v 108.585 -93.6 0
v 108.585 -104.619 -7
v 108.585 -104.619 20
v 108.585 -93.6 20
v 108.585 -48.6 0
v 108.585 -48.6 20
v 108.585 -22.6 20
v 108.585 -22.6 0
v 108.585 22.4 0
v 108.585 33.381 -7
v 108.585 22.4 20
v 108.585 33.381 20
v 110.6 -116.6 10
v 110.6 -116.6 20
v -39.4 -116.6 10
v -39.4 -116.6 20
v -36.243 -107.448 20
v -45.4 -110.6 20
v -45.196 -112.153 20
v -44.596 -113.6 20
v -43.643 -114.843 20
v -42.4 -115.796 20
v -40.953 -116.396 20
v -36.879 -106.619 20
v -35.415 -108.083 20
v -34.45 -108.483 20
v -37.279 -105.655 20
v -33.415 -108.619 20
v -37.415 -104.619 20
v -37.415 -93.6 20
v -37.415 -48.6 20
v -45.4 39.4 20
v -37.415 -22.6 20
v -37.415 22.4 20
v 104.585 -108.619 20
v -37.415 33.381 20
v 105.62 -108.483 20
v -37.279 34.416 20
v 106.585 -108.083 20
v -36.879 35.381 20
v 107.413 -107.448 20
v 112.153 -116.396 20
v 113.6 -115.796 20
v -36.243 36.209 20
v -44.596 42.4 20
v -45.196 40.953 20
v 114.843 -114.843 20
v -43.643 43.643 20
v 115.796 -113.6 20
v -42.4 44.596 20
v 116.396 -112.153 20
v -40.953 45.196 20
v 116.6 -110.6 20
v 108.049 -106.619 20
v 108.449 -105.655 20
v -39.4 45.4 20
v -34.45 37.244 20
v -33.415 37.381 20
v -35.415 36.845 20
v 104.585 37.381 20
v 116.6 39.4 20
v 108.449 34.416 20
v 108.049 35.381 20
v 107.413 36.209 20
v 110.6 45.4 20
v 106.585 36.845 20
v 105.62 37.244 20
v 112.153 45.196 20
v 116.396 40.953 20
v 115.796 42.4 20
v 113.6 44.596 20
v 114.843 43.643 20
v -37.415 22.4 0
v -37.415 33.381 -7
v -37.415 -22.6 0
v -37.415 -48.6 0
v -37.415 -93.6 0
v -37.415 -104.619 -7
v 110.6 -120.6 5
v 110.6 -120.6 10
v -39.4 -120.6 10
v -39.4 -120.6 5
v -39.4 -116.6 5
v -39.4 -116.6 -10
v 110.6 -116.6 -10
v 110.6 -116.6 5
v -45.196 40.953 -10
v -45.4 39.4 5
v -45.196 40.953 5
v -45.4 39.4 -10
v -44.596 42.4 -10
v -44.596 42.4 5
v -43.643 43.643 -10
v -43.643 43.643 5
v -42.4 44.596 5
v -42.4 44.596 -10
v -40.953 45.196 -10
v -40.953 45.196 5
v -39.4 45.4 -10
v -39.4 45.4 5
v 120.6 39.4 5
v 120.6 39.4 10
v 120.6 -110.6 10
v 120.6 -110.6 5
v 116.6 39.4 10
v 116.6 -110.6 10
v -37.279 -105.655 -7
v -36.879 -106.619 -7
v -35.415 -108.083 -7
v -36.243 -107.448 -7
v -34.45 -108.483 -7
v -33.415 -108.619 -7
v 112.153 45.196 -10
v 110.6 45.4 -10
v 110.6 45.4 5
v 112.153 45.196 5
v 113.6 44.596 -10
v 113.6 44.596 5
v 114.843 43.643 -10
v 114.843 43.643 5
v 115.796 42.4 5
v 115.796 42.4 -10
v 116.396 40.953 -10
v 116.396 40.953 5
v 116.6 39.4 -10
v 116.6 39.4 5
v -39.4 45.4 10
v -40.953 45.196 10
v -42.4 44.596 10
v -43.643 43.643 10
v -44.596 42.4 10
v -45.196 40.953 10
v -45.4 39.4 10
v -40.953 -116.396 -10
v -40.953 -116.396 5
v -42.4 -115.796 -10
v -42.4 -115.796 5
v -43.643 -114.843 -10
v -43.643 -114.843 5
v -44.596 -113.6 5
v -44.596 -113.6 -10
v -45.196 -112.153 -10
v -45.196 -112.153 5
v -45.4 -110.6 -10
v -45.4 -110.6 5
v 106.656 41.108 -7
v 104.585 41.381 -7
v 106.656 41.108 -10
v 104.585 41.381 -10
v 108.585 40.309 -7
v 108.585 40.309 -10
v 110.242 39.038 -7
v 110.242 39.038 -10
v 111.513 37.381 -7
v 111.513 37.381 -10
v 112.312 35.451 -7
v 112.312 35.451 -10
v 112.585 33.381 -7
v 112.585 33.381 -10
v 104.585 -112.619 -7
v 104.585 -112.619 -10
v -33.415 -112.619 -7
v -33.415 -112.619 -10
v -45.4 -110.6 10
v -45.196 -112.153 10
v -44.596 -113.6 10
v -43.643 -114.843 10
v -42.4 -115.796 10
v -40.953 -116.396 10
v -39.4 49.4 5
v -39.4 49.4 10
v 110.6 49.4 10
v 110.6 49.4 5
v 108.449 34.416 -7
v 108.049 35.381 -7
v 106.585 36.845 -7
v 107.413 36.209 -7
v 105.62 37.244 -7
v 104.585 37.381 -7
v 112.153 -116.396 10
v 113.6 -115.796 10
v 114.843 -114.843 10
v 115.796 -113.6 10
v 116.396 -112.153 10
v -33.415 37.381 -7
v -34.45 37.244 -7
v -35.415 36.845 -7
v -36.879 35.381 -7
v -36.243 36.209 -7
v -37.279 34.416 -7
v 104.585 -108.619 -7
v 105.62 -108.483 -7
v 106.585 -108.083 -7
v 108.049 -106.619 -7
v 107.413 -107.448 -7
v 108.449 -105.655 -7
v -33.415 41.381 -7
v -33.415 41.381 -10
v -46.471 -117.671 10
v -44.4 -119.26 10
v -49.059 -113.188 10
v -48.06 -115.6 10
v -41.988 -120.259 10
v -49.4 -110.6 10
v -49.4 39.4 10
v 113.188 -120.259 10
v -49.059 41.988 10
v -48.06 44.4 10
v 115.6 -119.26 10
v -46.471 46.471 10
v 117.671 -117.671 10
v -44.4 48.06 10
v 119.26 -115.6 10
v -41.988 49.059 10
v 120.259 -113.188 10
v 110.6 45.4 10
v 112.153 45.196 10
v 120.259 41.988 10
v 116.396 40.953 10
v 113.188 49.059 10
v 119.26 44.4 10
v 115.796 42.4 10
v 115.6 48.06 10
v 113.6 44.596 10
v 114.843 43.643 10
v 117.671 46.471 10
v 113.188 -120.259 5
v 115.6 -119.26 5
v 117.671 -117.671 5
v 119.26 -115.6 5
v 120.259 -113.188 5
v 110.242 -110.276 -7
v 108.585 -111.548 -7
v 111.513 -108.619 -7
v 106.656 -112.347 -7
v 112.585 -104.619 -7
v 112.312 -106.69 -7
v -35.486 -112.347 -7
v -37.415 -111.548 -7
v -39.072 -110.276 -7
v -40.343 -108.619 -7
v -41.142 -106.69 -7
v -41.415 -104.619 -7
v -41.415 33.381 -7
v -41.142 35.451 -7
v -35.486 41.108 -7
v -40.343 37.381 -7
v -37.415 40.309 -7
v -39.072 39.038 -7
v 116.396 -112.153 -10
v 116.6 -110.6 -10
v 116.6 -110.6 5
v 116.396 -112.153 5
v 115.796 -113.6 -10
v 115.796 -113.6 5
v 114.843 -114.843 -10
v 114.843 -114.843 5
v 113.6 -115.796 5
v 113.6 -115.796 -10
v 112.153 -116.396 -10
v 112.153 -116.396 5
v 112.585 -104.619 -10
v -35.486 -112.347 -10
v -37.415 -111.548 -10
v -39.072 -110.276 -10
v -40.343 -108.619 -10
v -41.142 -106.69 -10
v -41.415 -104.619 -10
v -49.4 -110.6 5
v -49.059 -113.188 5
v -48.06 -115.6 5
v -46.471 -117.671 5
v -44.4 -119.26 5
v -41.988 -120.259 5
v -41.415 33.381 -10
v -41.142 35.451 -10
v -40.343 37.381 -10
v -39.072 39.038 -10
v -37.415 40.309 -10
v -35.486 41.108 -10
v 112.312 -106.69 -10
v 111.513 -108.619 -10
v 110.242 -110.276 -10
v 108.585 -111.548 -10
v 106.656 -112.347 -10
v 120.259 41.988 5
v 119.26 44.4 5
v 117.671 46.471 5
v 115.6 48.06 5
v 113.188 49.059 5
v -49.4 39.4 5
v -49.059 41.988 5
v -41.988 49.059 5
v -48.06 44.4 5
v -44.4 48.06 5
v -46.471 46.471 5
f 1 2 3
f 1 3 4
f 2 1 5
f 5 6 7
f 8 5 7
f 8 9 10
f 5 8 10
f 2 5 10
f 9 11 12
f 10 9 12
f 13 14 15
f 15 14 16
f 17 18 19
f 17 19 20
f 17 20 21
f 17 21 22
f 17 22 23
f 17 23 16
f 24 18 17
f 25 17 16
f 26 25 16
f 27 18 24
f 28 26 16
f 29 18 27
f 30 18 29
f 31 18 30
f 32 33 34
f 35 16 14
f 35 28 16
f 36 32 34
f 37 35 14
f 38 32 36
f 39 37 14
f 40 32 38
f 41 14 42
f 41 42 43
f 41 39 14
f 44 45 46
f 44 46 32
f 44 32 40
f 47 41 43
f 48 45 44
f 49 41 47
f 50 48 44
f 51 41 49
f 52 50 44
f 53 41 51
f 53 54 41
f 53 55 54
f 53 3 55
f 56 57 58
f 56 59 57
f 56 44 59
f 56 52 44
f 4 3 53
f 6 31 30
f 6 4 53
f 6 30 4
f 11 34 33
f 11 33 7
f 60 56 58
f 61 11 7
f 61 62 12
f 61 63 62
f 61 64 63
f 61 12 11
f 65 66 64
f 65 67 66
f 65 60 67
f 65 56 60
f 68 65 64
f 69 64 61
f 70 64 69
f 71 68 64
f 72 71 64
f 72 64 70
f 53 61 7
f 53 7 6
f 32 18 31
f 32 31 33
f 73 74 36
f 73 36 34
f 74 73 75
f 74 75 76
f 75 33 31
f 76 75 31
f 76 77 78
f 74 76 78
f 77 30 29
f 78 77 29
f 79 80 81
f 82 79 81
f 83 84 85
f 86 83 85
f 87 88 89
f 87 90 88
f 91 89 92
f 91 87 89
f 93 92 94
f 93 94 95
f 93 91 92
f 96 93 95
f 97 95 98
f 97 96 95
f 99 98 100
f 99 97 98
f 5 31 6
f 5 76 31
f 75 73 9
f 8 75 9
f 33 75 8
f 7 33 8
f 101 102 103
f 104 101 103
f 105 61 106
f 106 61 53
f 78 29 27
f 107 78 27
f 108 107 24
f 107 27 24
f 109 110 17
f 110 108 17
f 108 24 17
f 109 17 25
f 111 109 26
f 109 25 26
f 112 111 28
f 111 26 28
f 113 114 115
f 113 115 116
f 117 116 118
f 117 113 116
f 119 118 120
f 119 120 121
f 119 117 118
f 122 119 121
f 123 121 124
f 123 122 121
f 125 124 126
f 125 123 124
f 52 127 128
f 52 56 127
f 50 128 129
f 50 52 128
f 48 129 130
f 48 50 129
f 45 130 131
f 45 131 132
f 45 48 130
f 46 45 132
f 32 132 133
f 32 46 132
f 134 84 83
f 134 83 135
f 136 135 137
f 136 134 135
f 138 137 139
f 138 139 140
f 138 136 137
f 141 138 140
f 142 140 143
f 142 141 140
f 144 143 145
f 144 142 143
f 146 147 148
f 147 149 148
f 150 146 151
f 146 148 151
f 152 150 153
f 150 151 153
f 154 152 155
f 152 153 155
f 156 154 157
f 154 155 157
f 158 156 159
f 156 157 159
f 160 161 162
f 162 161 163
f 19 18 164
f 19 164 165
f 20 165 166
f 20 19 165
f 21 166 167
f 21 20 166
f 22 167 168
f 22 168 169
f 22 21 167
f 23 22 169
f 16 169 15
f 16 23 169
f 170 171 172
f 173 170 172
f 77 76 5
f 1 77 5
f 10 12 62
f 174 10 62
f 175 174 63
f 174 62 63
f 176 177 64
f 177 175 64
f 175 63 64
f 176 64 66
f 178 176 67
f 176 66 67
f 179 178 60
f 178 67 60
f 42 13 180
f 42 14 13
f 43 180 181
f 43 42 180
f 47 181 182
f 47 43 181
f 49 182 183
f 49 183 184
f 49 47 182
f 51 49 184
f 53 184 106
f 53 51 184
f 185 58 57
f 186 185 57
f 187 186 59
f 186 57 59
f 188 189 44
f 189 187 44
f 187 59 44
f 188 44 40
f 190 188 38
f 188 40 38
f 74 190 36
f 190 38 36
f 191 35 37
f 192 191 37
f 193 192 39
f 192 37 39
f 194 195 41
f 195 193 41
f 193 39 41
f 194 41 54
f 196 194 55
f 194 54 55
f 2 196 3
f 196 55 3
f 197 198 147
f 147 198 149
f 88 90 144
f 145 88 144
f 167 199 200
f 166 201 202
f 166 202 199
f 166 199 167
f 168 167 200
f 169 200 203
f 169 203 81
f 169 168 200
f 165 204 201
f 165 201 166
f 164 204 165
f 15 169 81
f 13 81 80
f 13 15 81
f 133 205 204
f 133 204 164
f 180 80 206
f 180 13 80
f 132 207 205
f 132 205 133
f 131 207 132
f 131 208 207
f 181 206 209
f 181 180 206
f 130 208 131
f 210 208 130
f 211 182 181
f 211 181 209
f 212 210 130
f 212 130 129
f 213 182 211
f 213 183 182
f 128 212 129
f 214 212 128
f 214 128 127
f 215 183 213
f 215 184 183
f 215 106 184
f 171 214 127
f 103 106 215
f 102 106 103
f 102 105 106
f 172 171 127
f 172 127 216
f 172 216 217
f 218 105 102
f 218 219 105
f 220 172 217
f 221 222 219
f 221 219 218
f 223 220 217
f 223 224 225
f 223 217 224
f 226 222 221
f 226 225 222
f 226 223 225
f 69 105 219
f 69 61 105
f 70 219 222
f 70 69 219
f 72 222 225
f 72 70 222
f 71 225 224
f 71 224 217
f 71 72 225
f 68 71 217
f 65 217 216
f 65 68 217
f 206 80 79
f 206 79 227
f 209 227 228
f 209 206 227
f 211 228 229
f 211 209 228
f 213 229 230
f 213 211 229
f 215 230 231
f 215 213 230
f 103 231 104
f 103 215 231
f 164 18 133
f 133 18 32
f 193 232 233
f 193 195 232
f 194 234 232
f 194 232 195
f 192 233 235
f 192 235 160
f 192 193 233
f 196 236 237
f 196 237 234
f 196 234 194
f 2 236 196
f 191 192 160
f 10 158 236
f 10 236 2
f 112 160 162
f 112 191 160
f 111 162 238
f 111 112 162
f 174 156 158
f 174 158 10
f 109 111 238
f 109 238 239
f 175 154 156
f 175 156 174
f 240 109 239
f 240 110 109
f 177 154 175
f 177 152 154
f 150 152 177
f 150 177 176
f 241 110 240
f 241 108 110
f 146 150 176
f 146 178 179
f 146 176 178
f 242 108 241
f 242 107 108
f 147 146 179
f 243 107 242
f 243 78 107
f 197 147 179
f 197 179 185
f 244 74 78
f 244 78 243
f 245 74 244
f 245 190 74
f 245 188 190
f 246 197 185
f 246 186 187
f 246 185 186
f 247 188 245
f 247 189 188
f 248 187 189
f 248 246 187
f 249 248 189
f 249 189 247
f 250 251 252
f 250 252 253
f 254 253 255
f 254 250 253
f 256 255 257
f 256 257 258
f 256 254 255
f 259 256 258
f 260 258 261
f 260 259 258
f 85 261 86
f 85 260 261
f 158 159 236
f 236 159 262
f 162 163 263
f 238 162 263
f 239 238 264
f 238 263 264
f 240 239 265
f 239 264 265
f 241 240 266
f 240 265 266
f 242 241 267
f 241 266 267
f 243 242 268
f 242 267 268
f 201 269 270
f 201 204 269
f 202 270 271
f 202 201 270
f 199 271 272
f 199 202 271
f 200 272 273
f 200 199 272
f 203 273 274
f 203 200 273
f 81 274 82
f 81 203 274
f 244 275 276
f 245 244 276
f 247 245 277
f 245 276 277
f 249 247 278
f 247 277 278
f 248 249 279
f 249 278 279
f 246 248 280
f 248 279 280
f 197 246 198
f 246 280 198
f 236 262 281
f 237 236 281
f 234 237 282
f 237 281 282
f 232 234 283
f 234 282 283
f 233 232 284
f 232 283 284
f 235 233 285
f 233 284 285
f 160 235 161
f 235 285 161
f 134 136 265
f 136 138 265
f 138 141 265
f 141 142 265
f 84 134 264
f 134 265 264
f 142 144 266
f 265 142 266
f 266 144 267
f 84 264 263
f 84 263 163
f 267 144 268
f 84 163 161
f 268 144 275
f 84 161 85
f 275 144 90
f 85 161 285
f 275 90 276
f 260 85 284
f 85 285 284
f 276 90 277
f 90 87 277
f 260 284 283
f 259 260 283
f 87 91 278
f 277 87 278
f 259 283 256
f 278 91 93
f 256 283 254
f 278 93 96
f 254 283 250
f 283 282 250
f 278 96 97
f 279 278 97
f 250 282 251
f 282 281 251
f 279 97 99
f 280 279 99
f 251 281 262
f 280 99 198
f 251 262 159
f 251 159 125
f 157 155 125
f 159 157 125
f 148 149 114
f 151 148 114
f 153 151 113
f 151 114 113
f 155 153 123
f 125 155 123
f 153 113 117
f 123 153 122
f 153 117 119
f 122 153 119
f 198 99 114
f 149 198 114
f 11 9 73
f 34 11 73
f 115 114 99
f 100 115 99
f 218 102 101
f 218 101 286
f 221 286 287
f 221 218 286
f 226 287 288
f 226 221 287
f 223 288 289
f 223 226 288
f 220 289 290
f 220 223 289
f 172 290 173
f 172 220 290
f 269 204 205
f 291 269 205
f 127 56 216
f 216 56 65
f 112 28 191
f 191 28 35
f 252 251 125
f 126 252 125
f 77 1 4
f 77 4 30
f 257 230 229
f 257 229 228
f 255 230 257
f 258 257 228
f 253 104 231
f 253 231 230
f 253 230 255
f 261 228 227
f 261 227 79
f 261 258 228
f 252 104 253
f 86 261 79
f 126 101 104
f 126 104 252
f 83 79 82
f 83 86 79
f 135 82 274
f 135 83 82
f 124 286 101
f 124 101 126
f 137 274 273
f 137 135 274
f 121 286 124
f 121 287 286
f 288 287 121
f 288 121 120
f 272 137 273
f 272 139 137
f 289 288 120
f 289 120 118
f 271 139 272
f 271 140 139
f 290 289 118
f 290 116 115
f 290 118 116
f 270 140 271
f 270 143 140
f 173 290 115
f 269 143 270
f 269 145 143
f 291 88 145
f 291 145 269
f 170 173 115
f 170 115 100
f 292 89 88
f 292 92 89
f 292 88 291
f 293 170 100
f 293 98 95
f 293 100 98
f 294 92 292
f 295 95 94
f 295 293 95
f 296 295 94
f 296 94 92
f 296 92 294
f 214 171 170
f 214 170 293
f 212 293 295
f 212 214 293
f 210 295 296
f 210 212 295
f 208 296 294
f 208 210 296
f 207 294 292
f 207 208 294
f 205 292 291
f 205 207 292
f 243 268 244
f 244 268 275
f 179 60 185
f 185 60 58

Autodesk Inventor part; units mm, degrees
ref_plane "YZ Plane" through (0, 0, 0) normal (1, 0, 0) x (0, 1, 0)
ref_plane "XZ Plane" through (0, 0, 0) normal (0, 1, 0) x (-1, 0, 0)
ref_plane "XY Plane" through (0, 0, 0) normal (0, 0, 1) x (1, 0, 0)
ref_plane "Work Plane1" through (0, 0, 0) normal (0, 0, 1) x (1, 0, 0)
sketch "Sketch1" plane through (0, 0, 0) normal (0, 0, 1) x (1, 0, 0)
  line L0 (35.585, -35.585) -> (35.585, 35.585) projected
  line L1 (-35.585, -35.585) -> (35.585, -35.585) projected
  line L2 (35.615, -35.585) -> (106.785, -35.585) projected
  line L3 (35.615, -35.615) -> (35.615, -106.785) projected
  line L4 (-35.585, 35.585) -> (-35.585, -35.585) projected
  line L5 (35.585, 35.585) -> (-35.585, 35.585) projected
  line L6 (106.785, 35.585) -> (35.615, 35.585) projected
  line L7 (106.785, -35.585) -> (106.785, 35.585) projected
  line L8 (35.585, -35.585) -> (35.615, -35.615)
  line L9 (35.615, -35.585) -> (35.585, -35.615)
  line L10 (35.585, 35.8807) -> (107.085, 35.8807) construction
  line L11 (-35.915, 35.8807) -> (-35.915, 36.8807)
  line L12 (104.585, 37.3807) -> (-33.415, 37.3807)
  line L13 (-37.415, 33.3807) -> (-37.415, -104.6193)
  line L14 (-33.415, -108.6193) -> (104.585, -108.6193)
  line L15 (108.585, -104.6193) -> (108.585, 33.3807)
  arc A0 (104.585, -108.6193) -> (108.585, -104.6193) centre (104.585, -104.6193) ccw
  arc A1 (-37.415, -104.6193) -> (-33.415, -108.6193) centre (-33.415, -104.6193) ccw
  arc A2 (-33.415, 37.3807) -> (-37.415, 33.3807) centre (-33.415, 33.3807) ccw
  arc A3 (108.585, 33.3807) -> (104.585, 37.3807) centre (104.585, 33.3807) ccw
  line L16 (35.6, 49.4) -> (-39.4, 49.4)
  line L17 (120.6, 39.4) -> (120.6, -110.6)
  line L18 (110.6, -120.6) -> (-39.4, -120.6)
  line L19 (-49.4, -110.6) -> (-49.4, 39.4)
  arc A4 (-39.4, 49.4) -> (-49.4, 39.4) centre (-39.4, 39.4) ccw
  arc A5 (120.6, 39.4) -> (110.6, 49.4) centre (110.6, 39.4) ccw
  arc A6 (110.6, -120.6) -> (120.6, -110.6) centre (110.6, -110.6) ccw
  arc A7 (-49.4, -110.6) -> (-39.4, -120.6) centre (-39.4, -110.6) ccw
  line L20 (35.6, 49.4) -> (110.6, 49.4)
  point P0 (0, 0)
  point P1 (120.6, -120.6)
  point P2 (120.6, 49.4)
  point P3 (-49.4, -120.6)
  dimension "d2" = 71.5
  dimension "d15" = 1
  dimension "d18" = 4
  dimension "d21" = 170
  dimension "d22" = 170
  dimension "d23" = 10
extrude "Extrusion2" add sketch "Sketch1" against normal blind 10 contours L20 A5 L17 A6 L18 A7 L19 A4 L16
sketch "Sketch3" plane through (0, 0, 0) normal (0, 0, 1) x (1, 0, 0)
  arc A0 (104.585, -108.6193) -> (108.585, -104.6193) centre (104.585, -104.6193) ccw projected
  line L0 (104.585, -108.6193) -> (-33.415, -108.6193) projected
  arc A1 (-37.415, -104.6193) -> (-33.415, -108.6193) centre (-33.415, -104.6193) ccw projected
  line L1 (-37.415, -104.6193) -> (-37.415, 33.3807) projected
  arc A2 (-33.415, 37.3807) -> (-37.415, 33.3807) centre (-33.415, 33.3807) ccw projected
  line L2 (-33.415, 37.3807) -> (104.585, 37.3807) projected
  arc A3 (108.585, 33.3807) -> (104.585, 37.3807) centre (104.585, 33.3807) ccw projected
  line L3 (108.585, 33.3807) -> (108.585, -104.6193) projected
  line L4 (110.6, 49.4) -> (-39.4, 49.4) projected
  arc A4 (-39.4, 49.4) -> (-49.4, 39.4) centre (-39.4, 39.4) ccw projected
  line L5 (-49.4, 39.4) -> (-49.4, -110.6) projected
  arc A5 (-49.4, -110.6) -> (-39.4, -120.6) centre (-39.4, -110.6) ccw projected
  line L6 (-39.4, -120.6) -> (110.6, -120.6) projected
  arc A6 (110.6, -120.6) -> (120.6, -110.6) centre (110.6, -110.6) ccw projected
  line L7 (120.6, -110.6) -> (120.6, 39.4) projected
  arc A7 (120.6, 39.4) -> (110.6, 49.4) centre (110.6, 39.4) ccw projected
  line L8 (108.585, -93.6) -> (-37.415, -93.6)
  line L9 (-37.415, -48.6) -> (108.585, -48.6)
  line L10 (108.585, 22.4) -> (-37.415, 22.4)
  line L11 (-37.415, -22.6) -> (108.585, -22.6)
  line L12 (108.585, 22.4) -> (108.585, -22.6)
  line L13 (-37.415, 22.4) -> (-37.415, -22.6)
  line L14 (-37.415, -48.6) -> (-37.415, -93.6)
  line L15 (108.585, -48.6) -> (108.585, -93.6)
  point P0 (0, 0)
  dimension "d27" = 45
extrude "Extrusion3" add sketch "Sketch3" along normal blind 20 contours L8 L1 L9 L3 | L11 L1 L10 L3 | A7 L7 A6 L6 A5 L5 A4 L4
sketch "Sketch5" plane through (0, 0, -10) normal (0, 0, -1) x (-1, 0, 0)
  arc A0 (-108.585, -104.6193) -> (-104.585, -108.6193) centre (-104.585, -104.6193) ccw projected
  line L0 (-108.585, -104.6193) -> (-108.585, 33.3807) projected
  arc A1 (-104.585, 37.3807) -> (-108.585, 33.3807) centre (-104.585, 33.3807) ccw projected
  line L1 (-104.585, 37.3807) -> (33.415, 37.3807) projected
  arc A2 (37.415, 33.3807) -> (33.415, 37.3807) centre (33.415, 33.3807) ccw projected
  line L2 (37.415, 33.3807) -> (37.415, -104.6193) projected
  arc A3 (33.415, -108.6193) -> (37.415, -104.6193) centre (33.415, -104.6193) ccw projected
  line L3 (33.415, -108.6193) -> (-104.585, -108.6193) projected
  line L4 (33.415, 41.3807) -> (-104.585, 41.3807)
  arc A4 (-104.585, 41.3807) -> (-112.585, 33.3807) centre (-104.585, 33.3807) ccw
  line L5 (-112.585, 33.3807) -> (-112.585, -104.6193)
  arc A5 (-112.585, -104.6193) -> (-104.585, -112.6193) centre (-104.585, -104.6193) ccw
  line L6 (-104.585, -112.6193) -> (33.415, -112.6193)
  arc A6 (33.415, -112.6193) -> (41.415, -104.6193) centre (33.415, -104.6193) ccw
  line L7 (41.415, -104.6193) -> (41.415, 33.3807)
  arc A7 (41.415, 33.3807) -> (33.415, 41.3807) centre (33.415, 33.3807) ccw
  point P0 (0, 0)
  dimension "d32" = 4
extrude "Extrusion5" cut sketch "Sketch5" against normal blind 3
sketch "Sketch6" plane through (0, 0, -10) normal (0, 0, -1) x (-1, 0, 0)
  line L0 (39.4, 49.4) -> (-110.6, 49.4) projected
  arc A0 (-110.6, 49.4) -> (-120.6, 39.4) centre (-110.6, 39.4) ccw projected
  line L1 (-120.6, 39.4) -> (-120.6, -110.6) projected
  arc A1 (-120.6, -110.6) -> (-110.6, -120.6) centre (-110.6, -110.6) ccw projected
  line L2 (-110.6, -120.6) -> (39.4, -120.6) projected
  arc A2 (39.4, -120.6) -> (49.4, -110.6) centre (39.4, -110.6) ccw projected
  line L3 (49.4, -110.6) -> (49.4, 39.4) projected
  arc A3 (49.4, 39.4) -> (39.4, 49.4) centre (39.4, 39.4) ccw projected
  line L4 (-110.6, 45.4) -> (39.4, 45.4)
  arc A4 (45.4, 39.4) -> (39.4, 45.4) centre (39.4, 39.4) ccw
  line L5 (45.4, 39.4) -> (45.4, -110.6)
  arc A5 (39.4, -116.6) -> (45.4, -110.6) centre (39.4, -110.6) ccw
  line L6 (39.4, -116.6) -> (-110.6, -116.6)
  arc A6 (-116.6, -110.6) -> (-110.6, -116.6) centre (-110.6, -110.6) ccw
  line L7 (-116.6, -110.6) -> (-116.6, 39.4)
  arc A7 (-110.6, 45.4) -> (-116.6, 39.4) centre (-110.6, 39.4) ccw
  point P0 (0, 0)
  dimension "d35" = 4
extrude "Extrusion6" cut sketch "Sketch6" against normal blind 15
sketch "Sketch7" plane through (0, 0, 20) normal (0, 0, 1) x (1, 0, 0)
  line L0 (110.6, 49.4) -> (-39.4, 49.4) projected
  arc A0 (-39.4, 49.4) -> (-49.4, 39.4) centre (-39.4, 39.4) ccw projected
  line L1 (-49.4, 39.4) -> (-49.4, -110.6) projected
  arc A1 (-49.4, -110.6) -> (-39.4, -120.6) centre (-39.4, -110.6) ccw projected
  line L2 (-39.4, -120.6) -> (110.6, -120.6) projected
  arc A2 (110.6, -120.6) -> (120.6, -110.6) centre (110.6, -110.6) ccw projected
  line L3 (120.6, -110.6) -> (120.6, 39.4) projected
  arc A3 (120.6, 39.4) -> (110.6, 49.4) centre (110.6, 39.4) ccw projected
  line L4 (-39.4, 45.4) -> (110.6, 45.4)
  arc A4 (116.6, 39.4) -> (110.6, 45.4) centre (110.6, 39.4) ccw
  line L5 (116.6, 39.4) -> (116.6, -110.6)
  arc A5 (110.6, -116.6) -> (116.6, -110.6) centre (110.6, -110.6) ccw
  line L6 (110.6, -116.6) -> (-39.4, -116.6)
  arc A6 (-45.4, -110.6) -> (-39.4, -116.6) centre (-39.4, -110.6) ccw
  line L7 (-45.4, -110.6) -> (-45.4, 39.4)
  arc A7 (-39.4, 45.4) -> (-45.4, 39.4) centre (-39.4, 39.4) ccw
  point P0 (0, 0)
  dimension "d38" = 4
extrude "Extrusion7" cut sketch "Sketch7" against normal blind 10
properties part number "Case" material "Aluminum 6061"
